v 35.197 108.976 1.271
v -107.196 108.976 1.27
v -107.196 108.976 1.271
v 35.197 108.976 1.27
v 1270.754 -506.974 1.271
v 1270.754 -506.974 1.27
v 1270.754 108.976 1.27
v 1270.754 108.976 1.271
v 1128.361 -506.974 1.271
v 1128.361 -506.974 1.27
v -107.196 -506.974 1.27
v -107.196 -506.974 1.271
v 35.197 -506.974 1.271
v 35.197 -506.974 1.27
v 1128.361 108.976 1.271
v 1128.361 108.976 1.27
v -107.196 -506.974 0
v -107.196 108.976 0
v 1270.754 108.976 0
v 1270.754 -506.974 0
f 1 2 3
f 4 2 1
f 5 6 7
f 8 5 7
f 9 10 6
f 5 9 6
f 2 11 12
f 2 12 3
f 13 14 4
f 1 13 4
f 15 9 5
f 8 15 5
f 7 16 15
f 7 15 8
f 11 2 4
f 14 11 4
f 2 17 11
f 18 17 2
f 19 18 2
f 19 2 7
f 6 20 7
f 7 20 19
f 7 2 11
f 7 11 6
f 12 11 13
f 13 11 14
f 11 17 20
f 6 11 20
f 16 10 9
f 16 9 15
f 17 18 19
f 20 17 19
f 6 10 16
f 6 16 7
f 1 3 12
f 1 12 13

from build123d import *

# Parameters (mm, degrees)
F0_W     = 1377.95
F0_H     = 615.95
F1_DEPTH = 1.27
F2_W     = 142.392713
F2_H     = 615.95
F2_W_2   = 142.392714
F3_DEPTH = 0.000508


with BuildPart() as f1:
    # F0 (on Top) → F1 (new body)
    with BuildSketch(Plane.XY):
        with Locations((581.779068, -198.998591)):
            Rectangle(F0_W, F0_H)
    extrude(amount=F1_DEPTH)


with BuildPart() as f3:
    # F2 (on face) → F3 (new body)
    with BuildSketch(Plane.XY.offset(1.27)):
        with Locations((-35.999575, -198.998591)):
            Rectangle(F2_W, F2_H)
        with Locations((1199.557711, -198.998591)):
            Rectangle(F2_W_2, F2_H)
    extrude(amount=F3_DEPTH)


solid = Compound([f1.part, f3.part])
